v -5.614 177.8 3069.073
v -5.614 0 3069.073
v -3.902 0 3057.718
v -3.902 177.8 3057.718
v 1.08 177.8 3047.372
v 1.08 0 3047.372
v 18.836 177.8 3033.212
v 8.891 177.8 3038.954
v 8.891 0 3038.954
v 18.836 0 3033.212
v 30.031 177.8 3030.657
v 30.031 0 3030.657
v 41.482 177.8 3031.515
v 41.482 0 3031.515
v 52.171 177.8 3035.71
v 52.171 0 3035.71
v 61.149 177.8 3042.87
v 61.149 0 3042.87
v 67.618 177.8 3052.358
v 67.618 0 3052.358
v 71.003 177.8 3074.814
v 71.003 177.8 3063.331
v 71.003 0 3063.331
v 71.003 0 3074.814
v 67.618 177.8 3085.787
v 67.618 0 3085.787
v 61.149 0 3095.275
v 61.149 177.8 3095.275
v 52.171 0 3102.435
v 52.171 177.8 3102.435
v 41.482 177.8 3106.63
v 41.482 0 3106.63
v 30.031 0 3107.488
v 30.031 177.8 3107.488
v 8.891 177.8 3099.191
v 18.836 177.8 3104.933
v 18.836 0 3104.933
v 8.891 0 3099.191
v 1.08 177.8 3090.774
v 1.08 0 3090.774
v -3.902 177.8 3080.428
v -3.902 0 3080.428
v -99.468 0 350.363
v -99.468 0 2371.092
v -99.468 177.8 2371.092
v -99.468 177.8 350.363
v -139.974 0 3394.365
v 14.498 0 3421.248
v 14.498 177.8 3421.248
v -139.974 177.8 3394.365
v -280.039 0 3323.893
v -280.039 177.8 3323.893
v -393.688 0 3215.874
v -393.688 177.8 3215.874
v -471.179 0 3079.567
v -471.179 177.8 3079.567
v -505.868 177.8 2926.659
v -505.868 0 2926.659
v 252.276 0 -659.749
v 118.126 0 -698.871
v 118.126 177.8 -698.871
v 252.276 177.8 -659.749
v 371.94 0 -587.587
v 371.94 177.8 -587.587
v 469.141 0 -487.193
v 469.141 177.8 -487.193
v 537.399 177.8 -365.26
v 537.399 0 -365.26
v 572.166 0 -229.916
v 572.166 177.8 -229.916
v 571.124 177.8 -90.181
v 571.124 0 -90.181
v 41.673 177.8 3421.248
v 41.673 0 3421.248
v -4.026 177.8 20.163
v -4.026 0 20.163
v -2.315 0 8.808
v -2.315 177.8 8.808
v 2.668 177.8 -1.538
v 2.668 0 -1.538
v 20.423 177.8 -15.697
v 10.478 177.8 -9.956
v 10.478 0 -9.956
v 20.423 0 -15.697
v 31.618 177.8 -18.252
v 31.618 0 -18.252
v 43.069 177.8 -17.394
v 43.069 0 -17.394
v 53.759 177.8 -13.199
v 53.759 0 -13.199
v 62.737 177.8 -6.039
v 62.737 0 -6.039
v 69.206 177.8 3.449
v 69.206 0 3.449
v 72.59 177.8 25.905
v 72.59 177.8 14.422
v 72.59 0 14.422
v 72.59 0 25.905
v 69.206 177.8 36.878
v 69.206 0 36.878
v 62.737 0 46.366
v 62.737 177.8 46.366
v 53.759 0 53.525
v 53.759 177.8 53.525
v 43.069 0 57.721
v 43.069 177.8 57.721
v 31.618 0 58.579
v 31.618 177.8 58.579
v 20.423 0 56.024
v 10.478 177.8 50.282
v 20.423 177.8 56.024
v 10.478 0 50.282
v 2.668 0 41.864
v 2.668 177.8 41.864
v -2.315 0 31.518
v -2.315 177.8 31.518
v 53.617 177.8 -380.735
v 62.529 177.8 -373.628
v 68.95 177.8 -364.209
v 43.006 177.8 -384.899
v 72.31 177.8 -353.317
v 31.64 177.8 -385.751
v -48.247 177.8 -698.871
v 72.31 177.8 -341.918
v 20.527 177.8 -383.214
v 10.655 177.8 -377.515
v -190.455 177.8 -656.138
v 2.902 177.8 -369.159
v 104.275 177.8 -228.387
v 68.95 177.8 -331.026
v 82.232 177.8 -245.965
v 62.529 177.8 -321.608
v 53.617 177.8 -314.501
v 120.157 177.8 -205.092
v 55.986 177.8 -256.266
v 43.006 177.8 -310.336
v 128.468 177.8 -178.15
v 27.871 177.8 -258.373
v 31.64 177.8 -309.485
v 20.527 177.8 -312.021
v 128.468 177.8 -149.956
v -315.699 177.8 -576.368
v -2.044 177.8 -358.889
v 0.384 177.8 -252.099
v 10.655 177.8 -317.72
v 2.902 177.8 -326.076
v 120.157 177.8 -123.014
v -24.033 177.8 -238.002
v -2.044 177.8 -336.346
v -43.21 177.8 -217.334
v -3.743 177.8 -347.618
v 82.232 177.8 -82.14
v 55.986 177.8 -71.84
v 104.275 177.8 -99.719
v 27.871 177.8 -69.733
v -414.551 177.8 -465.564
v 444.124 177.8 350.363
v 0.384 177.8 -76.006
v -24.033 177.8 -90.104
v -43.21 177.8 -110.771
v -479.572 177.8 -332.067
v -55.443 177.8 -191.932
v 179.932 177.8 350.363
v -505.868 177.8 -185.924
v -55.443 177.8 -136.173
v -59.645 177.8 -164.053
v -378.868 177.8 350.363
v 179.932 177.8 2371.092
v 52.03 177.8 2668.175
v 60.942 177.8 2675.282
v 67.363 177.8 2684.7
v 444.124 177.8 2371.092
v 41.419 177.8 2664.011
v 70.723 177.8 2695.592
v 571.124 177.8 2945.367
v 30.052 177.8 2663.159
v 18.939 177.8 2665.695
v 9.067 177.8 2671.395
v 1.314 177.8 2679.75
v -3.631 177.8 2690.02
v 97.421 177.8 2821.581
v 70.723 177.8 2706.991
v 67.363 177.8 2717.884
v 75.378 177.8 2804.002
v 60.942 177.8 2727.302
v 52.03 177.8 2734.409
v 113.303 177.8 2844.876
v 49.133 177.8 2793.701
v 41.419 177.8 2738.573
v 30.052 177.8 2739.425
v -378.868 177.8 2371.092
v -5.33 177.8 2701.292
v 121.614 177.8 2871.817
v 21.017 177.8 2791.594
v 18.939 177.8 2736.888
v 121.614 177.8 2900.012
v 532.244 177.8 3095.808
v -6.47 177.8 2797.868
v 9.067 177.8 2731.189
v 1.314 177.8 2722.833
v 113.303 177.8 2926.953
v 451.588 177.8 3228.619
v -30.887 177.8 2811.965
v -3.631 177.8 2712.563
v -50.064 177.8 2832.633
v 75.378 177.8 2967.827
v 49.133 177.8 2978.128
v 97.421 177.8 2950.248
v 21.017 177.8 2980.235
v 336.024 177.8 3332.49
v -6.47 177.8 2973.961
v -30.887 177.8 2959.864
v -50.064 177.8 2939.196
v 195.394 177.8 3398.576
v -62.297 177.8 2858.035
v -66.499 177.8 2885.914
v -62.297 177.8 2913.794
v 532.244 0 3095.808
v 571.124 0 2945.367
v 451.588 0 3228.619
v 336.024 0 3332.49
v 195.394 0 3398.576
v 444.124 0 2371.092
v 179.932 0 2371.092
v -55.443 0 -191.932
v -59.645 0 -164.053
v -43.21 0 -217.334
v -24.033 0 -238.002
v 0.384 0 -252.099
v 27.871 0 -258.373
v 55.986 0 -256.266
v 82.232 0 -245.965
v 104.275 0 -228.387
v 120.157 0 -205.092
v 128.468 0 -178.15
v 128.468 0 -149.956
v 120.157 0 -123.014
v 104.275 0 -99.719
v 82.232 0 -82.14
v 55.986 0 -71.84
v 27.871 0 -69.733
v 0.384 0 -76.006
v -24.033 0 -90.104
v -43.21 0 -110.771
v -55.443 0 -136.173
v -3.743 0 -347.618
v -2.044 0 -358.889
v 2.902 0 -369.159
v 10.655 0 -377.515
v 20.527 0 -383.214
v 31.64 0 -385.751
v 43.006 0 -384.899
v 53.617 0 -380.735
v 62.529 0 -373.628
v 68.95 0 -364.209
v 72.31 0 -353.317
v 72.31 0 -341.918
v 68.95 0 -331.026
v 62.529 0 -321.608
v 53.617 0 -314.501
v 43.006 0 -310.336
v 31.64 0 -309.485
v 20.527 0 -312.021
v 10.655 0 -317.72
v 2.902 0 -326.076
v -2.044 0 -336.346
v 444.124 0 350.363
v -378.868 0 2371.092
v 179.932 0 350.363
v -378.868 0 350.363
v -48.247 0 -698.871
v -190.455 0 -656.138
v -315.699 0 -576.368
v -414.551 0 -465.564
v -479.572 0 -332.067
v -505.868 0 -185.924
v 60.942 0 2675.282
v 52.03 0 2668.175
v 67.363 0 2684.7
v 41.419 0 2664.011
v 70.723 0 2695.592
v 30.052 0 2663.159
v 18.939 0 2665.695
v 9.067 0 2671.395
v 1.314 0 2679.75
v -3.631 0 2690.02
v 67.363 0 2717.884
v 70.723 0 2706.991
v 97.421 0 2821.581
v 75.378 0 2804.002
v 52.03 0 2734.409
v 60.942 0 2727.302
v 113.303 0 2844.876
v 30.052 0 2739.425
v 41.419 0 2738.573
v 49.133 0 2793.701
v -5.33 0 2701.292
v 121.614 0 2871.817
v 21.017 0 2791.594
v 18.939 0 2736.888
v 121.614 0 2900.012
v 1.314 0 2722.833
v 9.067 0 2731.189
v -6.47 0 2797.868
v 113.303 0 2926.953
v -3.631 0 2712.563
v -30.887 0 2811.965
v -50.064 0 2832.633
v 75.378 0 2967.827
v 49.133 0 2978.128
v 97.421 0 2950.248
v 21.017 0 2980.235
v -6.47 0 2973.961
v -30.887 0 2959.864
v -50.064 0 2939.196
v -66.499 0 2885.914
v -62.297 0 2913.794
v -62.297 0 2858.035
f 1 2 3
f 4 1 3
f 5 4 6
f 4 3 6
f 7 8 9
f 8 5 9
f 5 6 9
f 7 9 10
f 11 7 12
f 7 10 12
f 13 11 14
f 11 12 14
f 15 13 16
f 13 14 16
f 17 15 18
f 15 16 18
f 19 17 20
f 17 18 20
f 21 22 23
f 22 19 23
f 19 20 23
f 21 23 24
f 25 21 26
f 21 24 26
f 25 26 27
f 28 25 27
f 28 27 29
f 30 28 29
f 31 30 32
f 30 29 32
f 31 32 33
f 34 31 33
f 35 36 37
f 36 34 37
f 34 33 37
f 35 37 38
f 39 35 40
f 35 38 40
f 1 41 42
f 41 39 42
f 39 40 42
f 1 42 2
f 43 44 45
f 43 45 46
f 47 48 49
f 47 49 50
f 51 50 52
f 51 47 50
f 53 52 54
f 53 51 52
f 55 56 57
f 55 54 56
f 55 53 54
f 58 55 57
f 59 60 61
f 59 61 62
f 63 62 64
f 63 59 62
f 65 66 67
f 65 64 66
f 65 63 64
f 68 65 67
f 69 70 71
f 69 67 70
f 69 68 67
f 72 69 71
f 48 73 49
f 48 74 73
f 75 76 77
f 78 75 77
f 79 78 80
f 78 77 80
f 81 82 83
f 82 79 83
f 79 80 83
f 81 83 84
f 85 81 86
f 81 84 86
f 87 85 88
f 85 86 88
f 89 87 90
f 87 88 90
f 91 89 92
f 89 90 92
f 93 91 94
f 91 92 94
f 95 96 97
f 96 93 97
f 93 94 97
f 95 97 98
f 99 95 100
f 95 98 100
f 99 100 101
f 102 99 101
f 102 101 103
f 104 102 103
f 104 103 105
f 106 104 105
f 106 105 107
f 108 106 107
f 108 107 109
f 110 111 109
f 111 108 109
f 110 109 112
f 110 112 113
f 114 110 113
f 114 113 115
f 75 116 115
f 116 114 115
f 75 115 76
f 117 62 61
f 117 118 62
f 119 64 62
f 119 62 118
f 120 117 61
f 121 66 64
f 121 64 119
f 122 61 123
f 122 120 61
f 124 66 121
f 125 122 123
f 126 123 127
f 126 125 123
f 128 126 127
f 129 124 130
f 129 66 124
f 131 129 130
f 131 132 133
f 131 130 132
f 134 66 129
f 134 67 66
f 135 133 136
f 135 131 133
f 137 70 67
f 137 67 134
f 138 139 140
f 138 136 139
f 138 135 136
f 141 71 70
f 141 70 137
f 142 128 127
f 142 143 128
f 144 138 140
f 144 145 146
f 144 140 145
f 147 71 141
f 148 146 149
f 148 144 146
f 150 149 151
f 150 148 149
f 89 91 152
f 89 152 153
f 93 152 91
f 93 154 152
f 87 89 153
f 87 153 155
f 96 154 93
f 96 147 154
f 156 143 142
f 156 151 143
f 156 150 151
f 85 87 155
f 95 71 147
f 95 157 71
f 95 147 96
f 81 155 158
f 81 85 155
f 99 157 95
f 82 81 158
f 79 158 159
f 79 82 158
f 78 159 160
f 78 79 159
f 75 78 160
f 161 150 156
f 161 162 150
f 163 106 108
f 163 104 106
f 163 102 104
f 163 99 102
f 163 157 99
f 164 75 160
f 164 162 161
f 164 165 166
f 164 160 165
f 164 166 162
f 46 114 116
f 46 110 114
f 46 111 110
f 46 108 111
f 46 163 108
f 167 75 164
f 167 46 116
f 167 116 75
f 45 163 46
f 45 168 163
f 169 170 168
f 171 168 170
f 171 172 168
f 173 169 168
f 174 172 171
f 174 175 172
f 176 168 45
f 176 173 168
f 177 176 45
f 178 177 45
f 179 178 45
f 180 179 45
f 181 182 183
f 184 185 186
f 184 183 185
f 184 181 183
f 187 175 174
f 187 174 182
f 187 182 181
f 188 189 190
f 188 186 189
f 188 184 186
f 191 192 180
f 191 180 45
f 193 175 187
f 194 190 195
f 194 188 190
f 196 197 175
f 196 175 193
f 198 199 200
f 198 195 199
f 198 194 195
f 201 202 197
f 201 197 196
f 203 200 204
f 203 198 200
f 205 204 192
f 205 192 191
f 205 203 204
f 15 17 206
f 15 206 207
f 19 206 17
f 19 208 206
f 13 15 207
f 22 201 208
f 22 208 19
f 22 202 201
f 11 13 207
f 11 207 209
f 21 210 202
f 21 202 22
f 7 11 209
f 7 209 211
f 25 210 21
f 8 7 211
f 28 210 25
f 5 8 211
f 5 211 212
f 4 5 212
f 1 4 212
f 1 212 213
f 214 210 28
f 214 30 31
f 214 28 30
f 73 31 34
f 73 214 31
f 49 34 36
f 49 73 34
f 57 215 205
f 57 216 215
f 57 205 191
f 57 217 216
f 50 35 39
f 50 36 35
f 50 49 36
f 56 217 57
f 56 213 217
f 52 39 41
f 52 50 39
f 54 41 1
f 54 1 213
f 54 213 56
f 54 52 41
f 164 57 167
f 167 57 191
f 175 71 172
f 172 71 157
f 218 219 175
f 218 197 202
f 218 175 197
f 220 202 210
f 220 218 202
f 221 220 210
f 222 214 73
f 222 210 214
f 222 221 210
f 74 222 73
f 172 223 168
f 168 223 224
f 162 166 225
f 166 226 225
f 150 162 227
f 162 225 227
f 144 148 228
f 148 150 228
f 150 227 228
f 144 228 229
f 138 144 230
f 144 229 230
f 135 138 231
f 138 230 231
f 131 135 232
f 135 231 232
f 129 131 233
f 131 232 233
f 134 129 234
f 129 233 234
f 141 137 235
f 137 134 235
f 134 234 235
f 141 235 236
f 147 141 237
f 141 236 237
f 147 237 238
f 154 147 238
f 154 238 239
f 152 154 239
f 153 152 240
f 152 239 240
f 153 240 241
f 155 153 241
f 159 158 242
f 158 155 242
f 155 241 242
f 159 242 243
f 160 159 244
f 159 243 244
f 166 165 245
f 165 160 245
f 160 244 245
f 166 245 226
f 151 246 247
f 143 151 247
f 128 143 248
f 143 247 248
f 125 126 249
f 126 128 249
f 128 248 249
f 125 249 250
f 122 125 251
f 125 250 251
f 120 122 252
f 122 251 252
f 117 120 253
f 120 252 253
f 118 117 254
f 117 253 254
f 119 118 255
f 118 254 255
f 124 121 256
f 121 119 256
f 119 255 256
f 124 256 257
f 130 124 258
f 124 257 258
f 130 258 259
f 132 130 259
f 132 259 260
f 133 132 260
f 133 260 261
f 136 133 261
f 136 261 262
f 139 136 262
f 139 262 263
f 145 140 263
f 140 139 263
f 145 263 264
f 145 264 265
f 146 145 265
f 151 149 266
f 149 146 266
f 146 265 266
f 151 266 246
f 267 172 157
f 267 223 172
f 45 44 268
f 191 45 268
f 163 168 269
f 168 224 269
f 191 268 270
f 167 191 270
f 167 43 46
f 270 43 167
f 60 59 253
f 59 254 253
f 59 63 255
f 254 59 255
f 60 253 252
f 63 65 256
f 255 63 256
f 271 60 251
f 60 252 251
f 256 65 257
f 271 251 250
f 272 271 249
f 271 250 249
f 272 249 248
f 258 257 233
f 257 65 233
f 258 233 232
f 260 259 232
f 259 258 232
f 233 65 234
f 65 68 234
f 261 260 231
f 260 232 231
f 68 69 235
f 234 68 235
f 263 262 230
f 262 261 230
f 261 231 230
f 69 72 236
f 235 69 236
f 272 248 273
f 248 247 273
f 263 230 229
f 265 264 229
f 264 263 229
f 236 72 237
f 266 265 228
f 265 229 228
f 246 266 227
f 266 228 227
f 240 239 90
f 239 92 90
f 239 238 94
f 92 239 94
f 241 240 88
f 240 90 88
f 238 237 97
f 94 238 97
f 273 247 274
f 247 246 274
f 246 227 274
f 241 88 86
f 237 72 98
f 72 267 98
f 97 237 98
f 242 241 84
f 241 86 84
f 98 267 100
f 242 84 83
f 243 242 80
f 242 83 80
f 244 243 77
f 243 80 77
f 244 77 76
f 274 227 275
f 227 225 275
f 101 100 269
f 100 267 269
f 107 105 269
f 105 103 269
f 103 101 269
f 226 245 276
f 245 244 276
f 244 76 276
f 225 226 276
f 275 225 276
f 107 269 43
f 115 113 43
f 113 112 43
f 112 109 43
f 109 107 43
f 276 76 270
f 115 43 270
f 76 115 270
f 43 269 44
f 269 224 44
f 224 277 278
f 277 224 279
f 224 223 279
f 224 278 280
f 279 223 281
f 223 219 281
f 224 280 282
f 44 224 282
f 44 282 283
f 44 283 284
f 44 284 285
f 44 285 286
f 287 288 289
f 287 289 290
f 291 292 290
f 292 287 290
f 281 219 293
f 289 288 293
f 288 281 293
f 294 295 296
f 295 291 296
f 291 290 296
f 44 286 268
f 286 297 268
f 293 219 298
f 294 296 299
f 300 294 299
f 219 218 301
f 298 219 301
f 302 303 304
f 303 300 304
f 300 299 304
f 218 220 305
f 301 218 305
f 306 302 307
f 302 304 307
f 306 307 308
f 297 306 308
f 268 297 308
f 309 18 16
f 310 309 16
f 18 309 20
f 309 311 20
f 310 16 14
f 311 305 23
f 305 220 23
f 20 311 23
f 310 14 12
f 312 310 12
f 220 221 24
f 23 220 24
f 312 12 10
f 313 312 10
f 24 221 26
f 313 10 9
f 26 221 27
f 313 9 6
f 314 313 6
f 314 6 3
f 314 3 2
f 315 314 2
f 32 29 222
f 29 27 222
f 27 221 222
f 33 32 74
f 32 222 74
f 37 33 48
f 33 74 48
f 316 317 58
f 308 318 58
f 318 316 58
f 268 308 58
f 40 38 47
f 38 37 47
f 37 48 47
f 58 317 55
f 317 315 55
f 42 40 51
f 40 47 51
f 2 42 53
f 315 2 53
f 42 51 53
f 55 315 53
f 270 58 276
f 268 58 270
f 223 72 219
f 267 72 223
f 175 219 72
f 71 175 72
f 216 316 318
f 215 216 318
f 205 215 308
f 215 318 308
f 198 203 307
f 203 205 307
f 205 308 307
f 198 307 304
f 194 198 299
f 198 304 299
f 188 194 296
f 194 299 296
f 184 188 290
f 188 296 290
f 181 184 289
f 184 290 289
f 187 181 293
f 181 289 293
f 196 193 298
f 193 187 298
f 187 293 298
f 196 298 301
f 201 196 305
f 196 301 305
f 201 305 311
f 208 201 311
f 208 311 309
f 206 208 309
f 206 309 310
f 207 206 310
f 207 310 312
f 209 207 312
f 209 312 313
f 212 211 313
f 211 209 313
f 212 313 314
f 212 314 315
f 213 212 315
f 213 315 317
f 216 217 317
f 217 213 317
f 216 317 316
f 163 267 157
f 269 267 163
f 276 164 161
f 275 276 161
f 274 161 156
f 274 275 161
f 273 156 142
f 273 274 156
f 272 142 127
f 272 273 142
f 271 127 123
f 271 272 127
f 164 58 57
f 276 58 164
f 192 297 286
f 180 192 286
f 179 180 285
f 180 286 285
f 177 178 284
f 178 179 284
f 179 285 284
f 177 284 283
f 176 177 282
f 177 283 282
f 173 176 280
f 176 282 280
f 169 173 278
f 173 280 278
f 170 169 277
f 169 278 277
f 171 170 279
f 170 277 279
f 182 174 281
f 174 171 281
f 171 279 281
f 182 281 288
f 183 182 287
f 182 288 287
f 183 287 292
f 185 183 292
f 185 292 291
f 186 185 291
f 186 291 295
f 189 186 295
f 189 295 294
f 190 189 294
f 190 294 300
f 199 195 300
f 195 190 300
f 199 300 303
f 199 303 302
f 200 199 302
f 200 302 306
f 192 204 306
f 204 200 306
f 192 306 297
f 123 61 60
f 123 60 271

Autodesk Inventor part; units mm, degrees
ref_plane "YZ Plane" through (0, 0, 0) normal (1, 0, 0) x (0, 1, 0)
ref_plane "XZ Plane" through (0, 0, 0) normal (0, 1, 0) x (-1, 0, 0)
ref_plane "XY Plane" through (0, 0, 0) normal (0, 0, 1) x (1, 0, 0)
sketch "Sketch1" plane through (0, 0, 0) normal (0, 1, 0) x (-1, 0, 0)
  circle A0 centre (-34.9394, -164.0528) radius 94.5846
  circle A1 centre (-34.4972, 20.1632) radius 38.5234
  circle A2 centre (-34.4972, -347.6177) radius 38.24
  line L0 (-41.6734, 3421.2475) -> (-14.4978, 3421.2475)
  line L1 (-118.1258, -698.8711) -> (48.2471, -698.8711)
  line L2 (-571.1236, 2945.3673) -> (-571.1236, -90.1812)
  line L3 (505.8676, 2926.6588) -> (505.8676, -185.9236)
  circle A3 centre (-28.0856, 2885.9144) radius 94.5846
  circle A4 centre (-32.9097, 3069.0726) radius 38.5234
  circle A5 centre (-32.9097, 2701.2918) radius 38.24
  arc A6 (505.8676, 2845.1699) -> (-41.6734, 3421.2475) centre (-28.0856, 2885.9144) ccw
  arc A7 (-571.1236, -90.1812) -> (505.8676, -142.1821) centre (-34.9394, -164.0528) ccw
  arc A8 (-41.6734, 3421.2475) -> (-571.1236, 2945.3673) centre (-41.6734, 2888.782) ccw
  line L4 (-571.1236, 2371.0918) -> (505.8676, 2371.0918)
  line L5 (-571.1236, 350.3632) -> (505.8676, 350.3632)
  line L6 (-444.1236, 2371.0918) -> (-444.1236, 350.3632)
  line L7 (99.4676, 2371.0918) -> (99.4676, 350.3632)
  line L8 (378.8676, 2371.0918) -> (378.8676, 350.3632)
  line L9 (-32.628, 2371.0918) -> (-32.628, 2350.4281)
  line L10 (-32.628, 377.1913) -> (-32.628, 350.3632)
  line L11 (-179.9324, 2371.0918) -> (-179.9324, 350.3632)
  point P0 (0, 0)
  point P1 (-40.1425, -163.2624)
  dimension "d0" = 535.5055
  dimension "d1" = 189.1691
  dimension "d2" = 76.48
  dimension "d3" = 77.0468
  dimension "d4" = 541.2491
  dimension "d5" = 532.4654
  dimension "d6" = 1076.9912
  dimension "d7" = 505.8676
  dimension "d8" = 457.6205
  dimension "d9" = 520.3654
  dimension "d10" = 533.9532
  dimension "d11" = 538.7773
  dimension "d12" = 538.7773
  dimension "d13" = 540.3648
  dimension "d14" = 540.3648
  dimension "d15" = 540.807
  dimension "d16" = 700.5345
  dimension "d17" = 39.9576
  dimension "d18" = 349.3252
  dimension "d19" = 2970.0562
  dimension "d20" = 3069.2491
  dimension "d21" = 2701.4922
  dimension "d22" = 546.0101
  dimension "d23" = 535.6087
  dimension "d24" = 330.2
  dimension "d25" = 330.2
  dimension "d26" = 127
  dimension "d27" = 279.4
  dimension "d28" = 127
  dimension "d29" = 279.4
extrude "Extrusion1" add sketch "Sketch1" along normal blind 177.8 contours L0 A6 L3 L4 L2 A8 | L4 L6 L5 L2 | L5 L3 A7 L1 L2 | L3 L5 L8 L4 | L4 L7 L5 L11
equation "\"BendRadius\" = Thickness"
equation "\"BendReliefWidth\" = Thickness"
equation "\"BendReliefDepth\" = 0.5 * Thickness"
equation "\"CornerReliefSize\" = 4 * Thickness"
equation "\"MinimumRemnant\" = 2 * Thickness"
equation "\"TransitionRadius\" = BendRadius"
equation "\"JacobiRadiusSize\" = BendRadius"
equation "\"GapSize\" = Thickness"
equation "\"Thickness\" = 3.048"
properties part number "new arm"
